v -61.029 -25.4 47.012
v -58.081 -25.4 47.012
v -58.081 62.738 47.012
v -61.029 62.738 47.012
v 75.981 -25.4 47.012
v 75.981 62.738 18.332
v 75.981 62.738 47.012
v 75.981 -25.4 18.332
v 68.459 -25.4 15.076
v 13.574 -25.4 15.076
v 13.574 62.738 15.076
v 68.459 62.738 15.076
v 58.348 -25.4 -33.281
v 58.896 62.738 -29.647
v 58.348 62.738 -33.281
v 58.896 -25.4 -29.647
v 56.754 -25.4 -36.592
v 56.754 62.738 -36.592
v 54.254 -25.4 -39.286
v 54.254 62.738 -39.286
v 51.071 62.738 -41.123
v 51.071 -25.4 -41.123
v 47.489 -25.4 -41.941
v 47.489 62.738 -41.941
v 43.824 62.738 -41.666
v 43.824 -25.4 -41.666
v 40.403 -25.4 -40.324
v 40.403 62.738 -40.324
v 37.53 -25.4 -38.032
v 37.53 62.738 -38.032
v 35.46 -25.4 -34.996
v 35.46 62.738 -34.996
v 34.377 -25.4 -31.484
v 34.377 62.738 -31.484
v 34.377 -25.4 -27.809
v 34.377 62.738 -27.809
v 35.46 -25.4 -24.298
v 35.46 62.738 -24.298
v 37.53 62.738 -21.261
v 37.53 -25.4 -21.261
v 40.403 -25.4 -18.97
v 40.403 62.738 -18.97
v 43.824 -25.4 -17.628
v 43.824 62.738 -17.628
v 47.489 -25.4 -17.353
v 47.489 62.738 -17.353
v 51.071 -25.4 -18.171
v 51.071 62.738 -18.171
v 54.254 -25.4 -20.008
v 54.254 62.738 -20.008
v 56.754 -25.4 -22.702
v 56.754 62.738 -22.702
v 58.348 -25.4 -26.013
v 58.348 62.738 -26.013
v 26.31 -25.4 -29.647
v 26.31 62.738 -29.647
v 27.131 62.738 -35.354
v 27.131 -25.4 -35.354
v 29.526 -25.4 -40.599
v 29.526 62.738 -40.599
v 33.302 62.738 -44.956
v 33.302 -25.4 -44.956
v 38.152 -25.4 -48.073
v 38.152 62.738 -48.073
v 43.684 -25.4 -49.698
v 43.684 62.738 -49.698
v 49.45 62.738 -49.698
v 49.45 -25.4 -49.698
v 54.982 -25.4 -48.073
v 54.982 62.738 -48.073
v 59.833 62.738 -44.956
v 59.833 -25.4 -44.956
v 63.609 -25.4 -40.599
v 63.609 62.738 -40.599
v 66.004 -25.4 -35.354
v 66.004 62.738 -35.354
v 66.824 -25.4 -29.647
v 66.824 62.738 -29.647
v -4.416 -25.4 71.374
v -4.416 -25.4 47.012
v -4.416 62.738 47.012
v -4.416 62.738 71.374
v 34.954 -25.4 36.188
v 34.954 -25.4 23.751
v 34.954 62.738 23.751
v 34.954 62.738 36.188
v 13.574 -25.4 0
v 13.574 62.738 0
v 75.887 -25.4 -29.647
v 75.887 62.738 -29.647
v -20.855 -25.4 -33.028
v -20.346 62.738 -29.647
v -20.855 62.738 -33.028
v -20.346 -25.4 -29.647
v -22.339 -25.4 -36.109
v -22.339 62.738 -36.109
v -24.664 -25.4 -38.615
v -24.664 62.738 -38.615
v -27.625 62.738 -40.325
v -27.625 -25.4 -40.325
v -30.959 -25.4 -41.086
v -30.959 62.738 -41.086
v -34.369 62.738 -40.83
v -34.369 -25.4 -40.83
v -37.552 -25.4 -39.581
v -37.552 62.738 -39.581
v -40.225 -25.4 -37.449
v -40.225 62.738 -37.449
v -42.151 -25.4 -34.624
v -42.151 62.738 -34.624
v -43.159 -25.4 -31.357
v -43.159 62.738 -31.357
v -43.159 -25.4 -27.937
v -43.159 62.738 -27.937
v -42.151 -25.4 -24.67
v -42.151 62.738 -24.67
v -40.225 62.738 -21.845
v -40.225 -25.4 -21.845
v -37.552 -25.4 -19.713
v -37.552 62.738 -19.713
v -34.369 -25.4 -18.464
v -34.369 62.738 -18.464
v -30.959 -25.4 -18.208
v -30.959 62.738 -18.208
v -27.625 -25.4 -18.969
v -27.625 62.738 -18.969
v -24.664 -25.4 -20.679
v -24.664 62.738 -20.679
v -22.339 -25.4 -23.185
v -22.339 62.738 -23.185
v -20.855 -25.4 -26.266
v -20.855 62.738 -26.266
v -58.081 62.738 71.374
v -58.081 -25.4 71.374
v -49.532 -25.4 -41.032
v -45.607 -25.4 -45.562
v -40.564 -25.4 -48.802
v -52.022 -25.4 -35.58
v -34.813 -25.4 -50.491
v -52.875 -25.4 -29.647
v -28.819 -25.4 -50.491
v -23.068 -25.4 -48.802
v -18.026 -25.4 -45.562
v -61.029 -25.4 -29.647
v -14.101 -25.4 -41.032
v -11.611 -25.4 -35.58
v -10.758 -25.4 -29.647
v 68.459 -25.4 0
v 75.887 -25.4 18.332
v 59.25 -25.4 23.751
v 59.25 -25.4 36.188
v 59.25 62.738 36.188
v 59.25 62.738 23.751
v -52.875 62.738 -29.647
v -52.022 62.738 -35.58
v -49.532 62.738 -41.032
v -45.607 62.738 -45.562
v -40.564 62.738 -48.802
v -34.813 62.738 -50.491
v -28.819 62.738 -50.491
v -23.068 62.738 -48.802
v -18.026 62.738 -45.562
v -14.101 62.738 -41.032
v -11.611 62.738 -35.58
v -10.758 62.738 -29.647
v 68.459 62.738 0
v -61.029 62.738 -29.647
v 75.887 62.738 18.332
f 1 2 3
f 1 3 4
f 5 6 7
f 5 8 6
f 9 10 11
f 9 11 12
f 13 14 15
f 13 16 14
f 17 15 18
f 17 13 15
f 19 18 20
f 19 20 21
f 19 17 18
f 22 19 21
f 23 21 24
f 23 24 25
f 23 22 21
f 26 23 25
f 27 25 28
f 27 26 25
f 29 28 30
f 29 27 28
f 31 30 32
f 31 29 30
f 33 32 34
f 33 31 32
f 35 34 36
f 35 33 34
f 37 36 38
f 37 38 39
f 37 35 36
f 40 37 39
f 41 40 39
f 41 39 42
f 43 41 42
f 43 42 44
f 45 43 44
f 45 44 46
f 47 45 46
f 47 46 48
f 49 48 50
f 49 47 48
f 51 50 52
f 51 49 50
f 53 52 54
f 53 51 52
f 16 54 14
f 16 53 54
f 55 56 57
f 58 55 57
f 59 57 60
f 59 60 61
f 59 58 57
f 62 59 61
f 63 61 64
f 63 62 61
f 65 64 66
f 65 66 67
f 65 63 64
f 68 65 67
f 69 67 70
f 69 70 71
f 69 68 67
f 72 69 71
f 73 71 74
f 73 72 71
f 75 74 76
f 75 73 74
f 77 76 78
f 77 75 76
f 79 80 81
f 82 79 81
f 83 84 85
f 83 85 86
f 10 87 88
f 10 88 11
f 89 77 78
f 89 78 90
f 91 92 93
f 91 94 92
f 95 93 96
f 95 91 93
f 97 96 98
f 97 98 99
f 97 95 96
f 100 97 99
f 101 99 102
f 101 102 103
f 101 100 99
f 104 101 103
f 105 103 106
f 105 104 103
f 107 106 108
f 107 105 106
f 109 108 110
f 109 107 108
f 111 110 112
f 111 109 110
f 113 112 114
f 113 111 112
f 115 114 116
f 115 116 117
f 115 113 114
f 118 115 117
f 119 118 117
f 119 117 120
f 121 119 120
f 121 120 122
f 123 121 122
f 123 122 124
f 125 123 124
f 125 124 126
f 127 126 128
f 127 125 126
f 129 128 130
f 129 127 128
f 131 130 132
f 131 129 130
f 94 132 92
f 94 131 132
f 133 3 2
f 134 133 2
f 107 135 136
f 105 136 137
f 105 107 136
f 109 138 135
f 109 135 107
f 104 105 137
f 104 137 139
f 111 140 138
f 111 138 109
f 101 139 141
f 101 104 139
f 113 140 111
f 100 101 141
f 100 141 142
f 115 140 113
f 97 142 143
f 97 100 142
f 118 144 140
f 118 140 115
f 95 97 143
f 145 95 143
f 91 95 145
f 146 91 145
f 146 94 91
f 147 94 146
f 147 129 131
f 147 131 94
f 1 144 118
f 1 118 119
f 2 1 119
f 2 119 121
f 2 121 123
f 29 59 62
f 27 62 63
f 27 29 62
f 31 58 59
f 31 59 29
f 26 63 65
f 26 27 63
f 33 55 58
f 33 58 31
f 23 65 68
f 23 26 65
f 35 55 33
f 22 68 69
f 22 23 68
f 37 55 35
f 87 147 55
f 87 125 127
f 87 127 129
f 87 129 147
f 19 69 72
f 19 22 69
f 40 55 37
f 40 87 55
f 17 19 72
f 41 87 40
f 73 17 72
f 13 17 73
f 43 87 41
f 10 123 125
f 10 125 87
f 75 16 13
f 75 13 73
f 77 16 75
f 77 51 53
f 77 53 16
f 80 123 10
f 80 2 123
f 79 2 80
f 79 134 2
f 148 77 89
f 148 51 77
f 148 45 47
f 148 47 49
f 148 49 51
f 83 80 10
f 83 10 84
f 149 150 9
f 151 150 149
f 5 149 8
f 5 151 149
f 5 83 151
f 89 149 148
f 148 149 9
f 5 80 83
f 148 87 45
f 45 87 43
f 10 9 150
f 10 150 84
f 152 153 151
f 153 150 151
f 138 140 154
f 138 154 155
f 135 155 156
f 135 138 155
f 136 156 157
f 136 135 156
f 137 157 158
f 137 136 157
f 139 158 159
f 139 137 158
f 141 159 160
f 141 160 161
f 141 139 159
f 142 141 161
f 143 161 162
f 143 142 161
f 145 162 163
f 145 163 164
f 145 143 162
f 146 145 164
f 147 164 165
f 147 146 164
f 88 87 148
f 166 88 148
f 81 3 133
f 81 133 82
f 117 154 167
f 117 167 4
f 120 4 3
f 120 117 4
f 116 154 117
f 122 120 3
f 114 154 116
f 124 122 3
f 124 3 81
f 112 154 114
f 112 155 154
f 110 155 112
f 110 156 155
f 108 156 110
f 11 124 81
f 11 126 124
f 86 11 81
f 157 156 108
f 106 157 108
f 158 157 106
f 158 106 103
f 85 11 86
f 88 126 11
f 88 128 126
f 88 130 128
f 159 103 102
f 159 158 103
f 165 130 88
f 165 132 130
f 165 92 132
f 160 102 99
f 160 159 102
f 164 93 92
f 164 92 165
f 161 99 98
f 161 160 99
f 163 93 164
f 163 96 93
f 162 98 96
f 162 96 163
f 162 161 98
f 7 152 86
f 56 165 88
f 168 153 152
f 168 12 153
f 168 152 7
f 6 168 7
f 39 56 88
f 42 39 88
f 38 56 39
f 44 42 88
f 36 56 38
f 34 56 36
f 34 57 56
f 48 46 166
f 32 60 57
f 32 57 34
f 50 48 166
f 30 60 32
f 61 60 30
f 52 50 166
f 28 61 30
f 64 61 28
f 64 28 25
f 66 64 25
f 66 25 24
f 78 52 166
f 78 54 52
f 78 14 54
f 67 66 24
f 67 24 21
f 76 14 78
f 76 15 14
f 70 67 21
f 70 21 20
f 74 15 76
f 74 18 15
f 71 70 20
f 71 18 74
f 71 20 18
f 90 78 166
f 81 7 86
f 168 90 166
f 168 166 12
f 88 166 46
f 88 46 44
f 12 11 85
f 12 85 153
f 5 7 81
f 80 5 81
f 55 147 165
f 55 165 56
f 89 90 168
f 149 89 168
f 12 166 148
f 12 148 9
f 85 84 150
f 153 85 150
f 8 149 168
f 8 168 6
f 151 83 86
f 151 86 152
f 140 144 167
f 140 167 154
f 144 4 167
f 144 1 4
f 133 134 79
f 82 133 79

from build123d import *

# Parameters (mm, degrees)
F0_W     = 21.6928645968
F0_H     = 12.4372411519
F0_W_2   = 24.2960043252
F0_W_3   = 53.6649217829
F0_H_2   = 15.3809413314
F0_W_4   = 54.884574376
F0_H_3   = 15.0760281831
F1_DEPTH = 25.4
F2_DEPTH = 62.738
F3_DEPTH = 71.374


with BuildPart() as f1:
    # F0 (on Front) → F1 (new body)
    with BuildSketch(Plane.XZ):
        Polygon((-61.0292442143, 47.0119267702), (-61.0292442143, 18.3321516961), (75.8868977427, 18.3321516961), (75.9811550379, 18.3321516961), (75.9811550379, 47.0119267702), align=None)
        with Locations((-32.8727662563, 29.9694752321)):
            Rectangle(F0_W, F0_H, mode=Mode.SUBTRACT)
        with Locations((47.1015777439, 29.9694752321)):
            Rectangle(F0_W_2, F0_H, mode=Mode.SUBTRACT)
        with BuildLine():
            Line((75.8868977427, 18.3321516961), (-61.0292442143, 18.3321516961))
            Line((-61.0292442143, 18.3321516961), (-61.0292442143, -29.6469051391))
            Line((-61.0292442143, -29.6469051391), (-52.8746465882, -29.6469051391))
            ThreePointArc((-52.8746465882, -29.6469051391), (-31.816188246, -8.5884467969), (-10.7577299038, -29.6469051391))
            Line((-10.7577299038, -29.6469051391), (26.3103456442, -29.6469051391))
            ThreePointArc((26.3103456442, -29.6469051391), (46.5673431754, -9.3899076079), (66.8243407066, -29.6469051391))
            Line((66.8243407066, -29.6469051391), (75.8868977427, -29.6469051391))
            Line((75.8868977427, -29.6469051391), (75.8868977427, 18.3321516961))
        make_face()
        with Locations((-31.2481601723, 7.6904706657)):
            Rectangle(F0_W_3, F0_H_2, mode=Mode.SUBTRACT)
        with Locations((41.0165307112, 7.5380140916)):
            Rectangle(F0_W_4, F0_H_3, mode=Mode.SUBTRACT)
        with BuildLine():
            ThreePointArc((-10.7577299038, -29.6469051391), (-31.816188246, -8.5884467969), (-52.8746465882, -29.6469051391))
            Line((-52.8746465882, -29.6469051391), (-43.2868667506, -29.6469051391))
            ThreePointArc((-43.2868667506, -29.6469051391), (-31.816188246, -18.1762266345), (-20.3455097415, -29.6469051391))
            Line((-20.3455097415, -29.6469051391), (-10.7577299038, -29.6469051391))
        make_face()
        with BuildLine():
            Line((-43.2868667506, -29.6469051391), (-52.8746465882, -29.6469051391))
            ThreePointArc((-52.8746465882, -29.6469051391), (-31.816188246, -50.7053634813), (-10.7577299038, -29.6469051391))
            Line((-10.7577299038, -29.6469051391), (-20.3455097415, -29.6469051391))
            ThreePointArc((-20.3455097415, -29.6469051391), (-31.816188246, -41.1175836436), (-43.2868667506, -29.6469051391))
        make_face()
        with BuildLine():
            ThreePointArc((26.3103456442, -29.6469051391), (46.5673431754, -49.9039026703), (66.8243407066, -29.6469051391))
            Line((66.8243407066, -29.6469051391), (58.8957230989, -29.6469051391))
            ThreePointArc((58.8957230989, -29.6469051391), (46.5673431754, -41.9752850626), (34.2389632519, -29.6469051391))
            Line((34.2389632519, -29.6469051391), (26.3103456442, -29.6469051391))
        make_face()
        with BuildLine():
            Line((58.8957230989, -29.6469051391), (66.8243407066, -29.6469051391))
            ThreePointArc((66.8243407066, -29.6469051391), (46.5673431754, -9.3899076079), (26.3103456442, -29.6469051391))
            Line((26.3103456442, -29.6469051391), (34.2389632519, -29.6469051391))
            ThreePointArc((34.2389632519, -29.6469051391), (46.5673431754, -17.3185252156), (58.8957230989, -29.6469051391))
        make_face()
    extrude(amount=F1_DEPTH)

    # F2 (add): a face of the model
    f2_faces = [f1.faces().sort_by_distance(p)[0] for p in [
        (7.2714959642, 0, 4.1694288848),
    ]]
    extrude(f2_faces, amount=F2_DEPTH)

    # F3 (add): faces of the model
    f3_faces = [f1.faces().sort_by_distance(p)[0] for p in [
        (-31.2481601723, -12.7, 0),
        (-31.2481601723, 31.369, 0),
    ]]
    extrude(f3_faces, amount=F3_DEPTH)


solid = f1.part
